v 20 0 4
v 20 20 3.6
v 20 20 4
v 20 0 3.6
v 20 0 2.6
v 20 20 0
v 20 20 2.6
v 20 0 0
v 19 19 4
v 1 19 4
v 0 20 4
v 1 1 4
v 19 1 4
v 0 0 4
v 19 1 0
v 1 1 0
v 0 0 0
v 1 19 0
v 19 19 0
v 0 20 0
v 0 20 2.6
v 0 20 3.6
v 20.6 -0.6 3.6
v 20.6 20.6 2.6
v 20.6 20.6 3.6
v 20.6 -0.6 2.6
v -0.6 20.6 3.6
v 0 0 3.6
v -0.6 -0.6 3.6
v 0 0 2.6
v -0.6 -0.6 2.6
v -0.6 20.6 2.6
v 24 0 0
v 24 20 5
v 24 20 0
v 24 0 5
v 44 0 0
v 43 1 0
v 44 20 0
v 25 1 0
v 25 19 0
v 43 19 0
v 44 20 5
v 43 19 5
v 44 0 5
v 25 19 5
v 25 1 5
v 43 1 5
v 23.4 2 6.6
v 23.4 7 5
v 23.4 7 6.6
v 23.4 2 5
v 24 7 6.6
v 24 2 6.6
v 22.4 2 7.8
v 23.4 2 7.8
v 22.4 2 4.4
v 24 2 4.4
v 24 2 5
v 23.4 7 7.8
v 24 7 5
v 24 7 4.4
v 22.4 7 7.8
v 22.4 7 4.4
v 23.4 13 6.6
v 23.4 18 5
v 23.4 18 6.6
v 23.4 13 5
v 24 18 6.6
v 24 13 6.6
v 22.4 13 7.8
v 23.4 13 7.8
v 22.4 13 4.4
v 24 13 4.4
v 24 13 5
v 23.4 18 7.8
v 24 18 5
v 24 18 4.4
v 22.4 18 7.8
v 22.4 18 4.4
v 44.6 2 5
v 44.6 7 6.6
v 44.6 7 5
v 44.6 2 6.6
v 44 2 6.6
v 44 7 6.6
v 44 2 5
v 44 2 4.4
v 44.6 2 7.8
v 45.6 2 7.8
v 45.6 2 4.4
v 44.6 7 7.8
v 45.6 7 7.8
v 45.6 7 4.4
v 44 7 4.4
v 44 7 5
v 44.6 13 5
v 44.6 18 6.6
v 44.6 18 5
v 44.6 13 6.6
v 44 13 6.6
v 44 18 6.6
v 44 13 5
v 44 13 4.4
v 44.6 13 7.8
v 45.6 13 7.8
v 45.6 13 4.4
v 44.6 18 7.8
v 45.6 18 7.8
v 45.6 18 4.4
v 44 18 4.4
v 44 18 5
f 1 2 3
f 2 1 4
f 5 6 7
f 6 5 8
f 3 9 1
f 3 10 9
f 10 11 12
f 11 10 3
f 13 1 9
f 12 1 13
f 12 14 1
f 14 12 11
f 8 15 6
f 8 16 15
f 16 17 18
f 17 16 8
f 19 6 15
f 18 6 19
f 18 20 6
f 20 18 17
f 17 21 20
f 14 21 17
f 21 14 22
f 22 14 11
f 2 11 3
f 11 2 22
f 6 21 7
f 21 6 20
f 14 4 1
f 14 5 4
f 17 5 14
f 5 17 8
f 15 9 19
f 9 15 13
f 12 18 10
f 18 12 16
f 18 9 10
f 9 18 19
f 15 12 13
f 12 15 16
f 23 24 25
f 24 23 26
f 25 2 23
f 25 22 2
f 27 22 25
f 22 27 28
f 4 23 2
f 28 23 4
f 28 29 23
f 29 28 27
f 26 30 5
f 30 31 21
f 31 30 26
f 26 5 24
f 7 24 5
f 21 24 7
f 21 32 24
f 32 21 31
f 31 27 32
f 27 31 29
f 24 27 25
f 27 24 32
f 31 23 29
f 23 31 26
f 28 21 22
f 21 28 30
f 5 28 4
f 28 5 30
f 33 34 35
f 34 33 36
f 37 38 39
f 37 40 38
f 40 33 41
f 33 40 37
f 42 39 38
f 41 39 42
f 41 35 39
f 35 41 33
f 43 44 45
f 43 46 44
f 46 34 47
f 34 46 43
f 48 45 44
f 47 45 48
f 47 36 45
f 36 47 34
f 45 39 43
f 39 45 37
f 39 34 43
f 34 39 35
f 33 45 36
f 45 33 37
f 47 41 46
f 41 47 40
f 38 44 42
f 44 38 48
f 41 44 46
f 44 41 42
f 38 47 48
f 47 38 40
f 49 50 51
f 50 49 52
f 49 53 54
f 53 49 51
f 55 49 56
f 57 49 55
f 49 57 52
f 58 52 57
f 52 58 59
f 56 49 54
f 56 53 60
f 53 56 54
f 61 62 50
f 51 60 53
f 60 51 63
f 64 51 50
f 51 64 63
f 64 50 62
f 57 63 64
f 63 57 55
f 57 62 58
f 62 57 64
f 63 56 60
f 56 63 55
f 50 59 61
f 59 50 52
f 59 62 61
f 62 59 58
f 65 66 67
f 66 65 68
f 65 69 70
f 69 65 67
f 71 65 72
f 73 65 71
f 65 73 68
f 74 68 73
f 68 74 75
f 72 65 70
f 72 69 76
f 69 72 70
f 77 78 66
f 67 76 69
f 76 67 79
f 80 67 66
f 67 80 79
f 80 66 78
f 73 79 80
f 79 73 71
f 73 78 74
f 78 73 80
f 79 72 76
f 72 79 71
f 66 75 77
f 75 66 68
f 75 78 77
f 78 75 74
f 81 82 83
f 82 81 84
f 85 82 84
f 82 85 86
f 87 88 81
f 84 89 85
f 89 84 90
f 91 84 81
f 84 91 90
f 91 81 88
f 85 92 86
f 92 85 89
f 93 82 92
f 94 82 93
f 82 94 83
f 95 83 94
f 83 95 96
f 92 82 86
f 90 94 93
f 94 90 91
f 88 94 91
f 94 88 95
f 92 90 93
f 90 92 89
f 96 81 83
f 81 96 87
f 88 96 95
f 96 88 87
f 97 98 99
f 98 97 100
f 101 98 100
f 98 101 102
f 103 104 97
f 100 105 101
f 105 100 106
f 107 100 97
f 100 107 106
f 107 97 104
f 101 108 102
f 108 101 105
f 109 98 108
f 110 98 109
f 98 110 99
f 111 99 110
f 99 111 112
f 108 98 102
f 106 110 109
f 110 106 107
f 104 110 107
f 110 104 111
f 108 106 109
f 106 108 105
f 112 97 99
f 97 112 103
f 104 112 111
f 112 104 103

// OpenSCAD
// file: Prism.scad
// parameters
X = 10;
Y = 5;
H = 30;

module Prism(x, y, h){
    rotate([0, 270, 0]) {
         polyhedron(
             points=[[0,0,0], [h,0,0], [h,x,0], [0,x,0], [0,x,y], [h,x,y]],
             faces=[[0,1,2,3],[5,4,3,2],[0,4,5,1],[0,3,4],[5,2,1]]
             );
    }
}

// main
Prism(X, Y, H);
// main file
use <Prism.scad>;

// parameters
X = 20;
Y = 20;
Z_BOX = 4;
Z_CAP = 5;
THICKNESS = 1;
H_MOUNT = 0.6;

module SnapCap(x, y, z_box, z_cap, thickness, h_mount) {
    module SC_Hook(w, h) {
        // prism hook
        rotate([90, 0, 0])
            translate([0, 0, -h])
                Prism(x=2*w, y=w, h=h);

        // arm
        cube([1, h, 4*w+1]);

        // mounter
        translate([-w, 0, 4*w+1-w])
        cube([w, h, w]);
    }

    // box
    difference() {
        cube([x, y, z_box]);
        translate([thickness, thickness, 0])
            cube([x-2*thickness, y-2*thickness, z_box]);
    }
    // mount
    translate([-h_mount, -h_mount, z_box-h_mount-0.8]) {
        difference() {
            cube([x+2*h_mount, y+2*h_mount, 1]);
        translate([h_mount, h_mount, 0])
            cube([x, y, 1]);
        }
    }

    // cap
    // for printing -----------------------------------------------------
    rotate([0, 180, 0])
        translate([-2*x-4*thickness, 0, -z_box-z_cap]) {
    // ------------------------------------------------------------------
    translate([0, 0, z_box]) {
        difference() {
            cube([x, y, z_cap]);
            translate([thickness, thickness, 0])
                cube([x-2*thickness, y-2*thickness, z_cap]);
        }

        // hook
        translate([x+h_mount, thickness+1, -3*h_mount-1])
            SC_Hook(h_mount, x/4);
        translate([x+h_mount, y-(thickness+1+x/4), -3*h_mount-1])
            SC_Hook(h_mount, x/4);
        mirror([1, 0, 0]) {
            translate([h_mount, thickness+1, -3*h_mount-1])
                SC_Hook(h_mount, x/4);
            translate([h_mount, y-(thickness+1+x/4), -3*h_mount-1])
                SC_Hook(h_mount, x/4);
        }
    }
    // for printing -----------------------------------------------------
    }
    // ------------------------------------------------------------------
}

// main
SnapCap(X, Y, Z_BOX, Z_CAP, THICKNESS, H_MOUNT);
